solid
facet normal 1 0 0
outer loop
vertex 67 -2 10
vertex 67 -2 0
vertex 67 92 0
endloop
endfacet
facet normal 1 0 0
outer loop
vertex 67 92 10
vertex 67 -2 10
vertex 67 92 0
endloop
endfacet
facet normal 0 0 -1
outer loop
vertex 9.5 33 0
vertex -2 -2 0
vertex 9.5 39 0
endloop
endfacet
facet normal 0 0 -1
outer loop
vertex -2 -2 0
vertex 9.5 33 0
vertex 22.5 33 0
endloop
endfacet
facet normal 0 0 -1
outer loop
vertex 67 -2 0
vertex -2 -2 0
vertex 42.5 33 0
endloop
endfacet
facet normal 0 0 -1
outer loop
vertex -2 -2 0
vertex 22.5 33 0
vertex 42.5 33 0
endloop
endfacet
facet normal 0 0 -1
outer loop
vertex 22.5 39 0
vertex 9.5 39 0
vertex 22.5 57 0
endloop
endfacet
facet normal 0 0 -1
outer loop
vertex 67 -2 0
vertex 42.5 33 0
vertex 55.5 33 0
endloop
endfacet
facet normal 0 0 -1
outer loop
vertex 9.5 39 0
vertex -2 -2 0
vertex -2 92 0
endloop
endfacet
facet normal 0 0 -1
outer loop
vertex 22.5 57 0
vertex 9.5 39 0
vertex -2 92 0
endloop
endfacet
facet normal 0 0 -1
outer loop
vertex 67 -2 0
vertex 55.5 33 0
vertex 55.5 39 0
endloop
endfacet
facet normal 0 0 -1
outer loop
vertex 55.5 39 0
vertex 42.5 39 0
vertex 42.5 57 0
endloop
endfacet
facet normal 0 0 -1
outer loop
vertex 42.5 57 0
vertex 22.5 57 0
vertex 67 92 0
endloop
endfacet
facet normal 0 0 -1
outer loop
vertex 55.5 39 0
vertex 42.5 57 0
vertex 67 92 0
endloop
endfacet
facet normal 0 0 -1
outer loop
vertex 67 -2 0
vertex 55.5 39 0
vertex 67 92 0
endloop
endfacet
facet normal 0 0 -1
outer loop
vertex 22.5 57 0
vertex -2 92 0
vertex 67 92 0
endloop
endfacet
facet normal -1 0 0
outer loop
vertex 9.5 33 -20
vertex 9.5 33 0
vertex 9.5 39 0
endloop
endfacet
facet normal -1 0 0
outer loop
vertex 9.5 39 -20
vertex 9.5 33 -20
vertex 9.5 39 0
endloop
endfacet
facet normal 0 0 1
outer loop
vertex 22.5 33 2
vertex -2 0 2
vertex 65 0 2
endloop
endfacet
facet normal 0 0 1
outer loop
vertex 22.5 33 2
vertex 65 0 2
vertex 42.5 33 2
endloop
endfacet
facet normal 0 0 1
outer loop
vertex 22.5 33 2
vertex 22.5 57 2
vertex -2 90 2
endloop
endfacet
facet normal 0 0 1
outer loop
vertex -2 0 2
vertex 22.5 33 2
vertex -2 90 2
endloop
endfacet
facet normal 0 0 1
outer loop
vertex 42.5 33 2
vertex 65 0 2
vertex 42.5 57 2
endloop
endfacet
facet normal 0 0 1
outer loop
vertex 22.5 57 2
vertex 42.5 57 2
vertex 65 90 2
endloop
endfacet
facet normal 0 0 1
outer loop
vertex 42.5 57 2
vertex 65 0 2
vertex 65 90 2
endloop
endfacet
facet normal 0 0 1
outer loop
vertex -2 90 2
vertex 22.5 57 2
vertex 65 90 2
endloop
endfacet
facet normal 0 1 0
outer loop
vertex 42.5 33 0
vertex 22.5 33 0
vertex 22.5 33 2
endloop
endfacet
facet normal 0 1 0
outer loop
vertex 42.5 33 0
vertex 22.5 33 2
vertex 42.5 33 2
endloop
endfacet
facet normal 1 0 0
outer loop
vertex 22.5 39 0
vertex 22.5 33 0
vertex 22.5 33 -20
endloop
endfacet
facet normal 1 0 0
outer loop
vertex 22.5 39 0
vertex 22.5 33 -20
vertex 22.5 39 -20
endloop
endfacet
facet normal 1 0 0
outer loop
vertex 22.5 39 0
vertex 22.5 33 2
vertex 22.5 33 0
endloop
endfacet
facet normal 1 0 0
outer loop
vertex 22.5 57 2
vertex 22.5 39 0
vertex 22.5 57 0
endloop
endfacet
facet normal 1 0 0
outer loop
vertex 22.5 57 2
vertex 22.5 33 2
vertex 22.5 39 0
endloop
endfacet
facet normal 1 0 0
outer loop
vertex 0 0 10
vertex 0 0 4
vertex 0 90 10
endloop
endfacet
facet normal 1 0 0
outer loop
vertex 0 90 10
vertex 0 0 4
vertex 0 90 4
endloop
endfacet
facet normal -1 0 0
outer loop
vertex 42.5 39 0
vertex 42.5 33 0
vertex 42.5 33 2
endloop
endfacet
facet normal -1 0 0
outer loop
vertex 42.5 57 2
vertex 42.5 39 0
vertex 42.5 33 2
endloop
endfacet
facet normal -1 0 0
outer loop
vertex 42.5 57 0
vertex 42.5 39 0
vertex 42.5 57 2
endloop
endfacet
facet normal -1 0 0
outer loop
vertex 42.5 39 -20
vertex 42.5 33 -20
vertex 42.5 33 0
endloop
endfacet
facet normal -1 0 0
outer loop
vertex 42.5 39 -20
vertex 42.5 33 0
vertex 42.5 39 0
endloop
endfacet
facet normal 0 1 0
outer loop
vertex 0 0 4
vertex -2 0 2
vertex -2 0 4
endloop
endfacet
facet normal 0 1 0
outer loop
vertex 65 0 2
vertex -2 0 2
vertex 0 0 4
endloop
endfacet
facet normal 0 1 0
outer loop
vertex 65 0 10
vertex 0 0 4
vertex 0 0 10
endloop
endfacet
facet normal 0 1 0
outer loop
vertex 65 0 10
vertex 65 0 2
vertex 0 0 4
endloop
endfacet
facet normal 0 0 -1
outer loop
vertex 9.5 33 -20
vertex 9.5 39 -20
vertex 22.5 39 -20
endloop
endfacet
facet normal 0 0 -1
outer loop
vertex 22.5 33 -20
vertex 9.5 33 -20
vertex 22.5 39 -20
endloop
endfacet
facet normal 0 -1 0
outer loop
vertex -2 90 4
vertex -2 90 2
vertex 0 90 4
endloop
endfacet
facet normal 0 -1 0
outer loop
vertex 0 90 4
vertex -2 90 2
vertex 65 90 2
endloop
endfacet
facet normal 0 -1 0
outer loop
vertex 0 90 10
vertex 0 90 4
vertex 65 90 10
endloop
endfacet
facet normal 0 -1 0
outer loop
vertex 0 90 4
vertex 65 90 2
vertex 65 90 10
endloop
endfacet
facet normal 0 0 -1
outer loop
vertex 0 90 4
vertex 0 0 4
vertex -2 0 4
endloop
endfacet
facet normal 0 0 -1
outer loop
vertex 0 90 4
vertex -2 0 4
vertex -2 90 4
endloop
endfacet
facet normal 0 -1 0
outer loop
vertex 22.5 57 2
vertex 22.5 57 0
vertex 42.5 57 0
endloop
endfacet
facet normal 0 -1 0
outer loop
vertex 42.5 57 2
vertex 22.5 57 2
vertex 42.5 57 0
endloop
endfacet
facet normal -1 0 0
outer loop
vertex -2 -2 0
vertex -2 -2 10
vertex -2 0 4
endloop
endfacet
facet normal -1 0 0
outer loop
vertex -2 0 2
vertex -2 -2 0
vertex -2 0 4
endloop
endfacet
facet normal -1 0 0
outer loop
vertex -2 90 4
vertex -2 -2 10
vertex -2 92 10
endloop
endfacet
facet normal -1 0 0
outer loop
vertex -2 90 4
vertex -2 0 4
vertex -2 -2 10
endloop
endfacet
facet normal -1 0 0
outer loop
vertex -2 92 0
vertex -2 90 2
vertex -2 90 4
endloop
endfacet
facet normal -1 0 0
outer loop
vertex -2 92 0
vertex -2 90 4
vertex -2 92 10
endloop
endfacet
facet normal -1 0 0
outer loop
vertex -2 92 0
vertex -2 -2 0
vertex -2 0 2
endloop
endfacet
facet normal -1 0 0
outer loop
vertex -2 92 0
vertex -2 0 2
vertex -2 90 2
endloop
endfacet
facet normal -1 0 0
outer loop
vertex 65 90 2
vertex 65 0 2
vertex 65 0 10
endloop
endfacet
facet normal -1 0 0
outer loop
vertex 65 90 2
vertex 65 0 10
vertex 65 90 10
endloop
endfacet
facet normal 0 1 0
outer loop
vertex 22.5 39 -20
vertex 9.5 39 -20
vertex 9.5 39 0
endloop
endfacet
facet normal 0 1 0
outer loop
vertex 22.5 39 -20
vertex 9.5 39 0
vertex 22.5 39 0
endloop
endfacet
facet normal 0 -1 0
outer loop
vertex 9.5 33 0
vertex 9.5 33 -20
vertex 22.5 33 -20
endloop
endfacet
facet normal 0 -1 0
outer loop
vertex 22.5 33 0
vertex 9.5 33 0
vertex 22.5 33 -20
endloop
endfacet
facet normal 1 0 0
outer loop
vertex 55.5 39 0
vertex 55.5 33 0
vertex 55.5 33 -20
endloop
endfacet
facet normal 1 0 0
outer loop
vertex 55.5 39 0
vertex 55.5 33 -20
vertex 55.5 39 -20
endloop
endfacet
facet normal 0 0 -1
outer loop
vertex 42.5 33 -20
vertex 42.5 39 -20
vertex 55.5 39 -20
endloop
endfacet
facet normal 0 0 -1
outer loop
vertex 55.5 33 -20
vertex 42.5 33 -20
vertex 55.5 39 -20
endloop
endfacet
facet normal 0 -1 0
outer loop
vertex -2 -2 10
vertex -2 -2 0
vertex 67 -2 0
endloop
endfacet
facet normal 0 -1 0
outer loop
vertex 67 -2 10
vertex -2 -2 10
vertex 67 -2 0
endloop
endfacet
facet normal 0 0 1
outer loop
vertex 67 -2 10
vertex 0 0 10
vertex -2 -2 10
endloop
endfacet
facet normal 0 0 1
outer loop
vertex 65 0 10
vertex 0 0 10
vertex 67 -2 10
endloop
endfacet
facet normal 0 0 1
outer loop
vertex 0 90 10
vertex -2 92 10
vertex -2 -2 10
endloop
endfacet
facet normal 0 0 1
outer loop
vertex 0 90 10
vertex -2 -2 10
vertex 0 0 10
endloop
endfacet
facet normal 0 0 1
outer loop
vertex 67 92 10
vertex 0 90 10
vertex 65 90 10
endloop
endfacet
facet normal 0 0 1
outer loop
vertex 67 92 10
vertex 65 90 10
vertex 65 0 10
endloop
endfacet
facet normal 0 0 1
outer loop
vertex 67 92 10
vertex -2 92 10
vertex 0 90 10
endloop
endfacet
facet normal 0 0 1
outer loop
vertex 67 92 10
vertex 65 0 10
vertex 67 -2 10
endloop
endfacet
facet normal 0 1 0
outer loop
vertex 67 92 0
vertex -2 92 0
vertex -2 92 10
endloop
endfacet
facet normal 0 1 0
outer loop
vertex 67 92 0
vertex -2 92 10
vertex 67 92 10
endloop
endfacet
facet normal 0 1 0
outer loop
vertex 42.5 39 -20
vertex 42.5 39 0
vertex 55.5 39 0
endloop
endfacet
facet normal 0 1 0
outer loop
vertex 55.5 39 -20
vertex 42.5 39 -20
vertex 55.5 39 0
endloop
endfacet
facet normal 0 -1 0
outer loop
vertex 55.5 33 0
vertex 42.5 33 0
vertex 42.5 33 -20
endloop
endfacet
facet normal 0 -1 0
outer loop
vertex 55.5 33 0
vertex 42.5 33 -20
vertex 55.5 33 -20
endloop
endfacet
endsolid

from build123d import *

# Parameters (mm, degrees)
SKETCH_W             = 69
SKETCH_H             = 94
SKETCH_W_2           = 65
SKETCH_H_2           = 90
PAD_DEPTH            = 10
SKETCH001_W          = 65
SKETCH001_H          = 90
PAD001_DEPTH         = 2
SKETCH002_W          = 90
SKETCH002_H          = 2
POCKET_DEPTH         = 2.001
SKETCH003_W          = 20
SKETCH003_H          = 24
POCKET001_DEPTH      = 0.001
POCKET001_DEPTH_BACK = -10.001
SKETCH004_W          = 13
SKETCH004_H          = 6
PAD002_DEPTH         = 20


with BuildPart() as part:
    # Sketch → Pad (new body)
    with BuildSketch(Plane.XY):
        with Locations((32.5, 45)):
            Rectangle(SKETCH_W, SKETCH_H)
        with Locations((32.5, 45)):
            Rectangle(SKETCH_W_2, SKETCH_H_2, mode=Mode.SUBTRACT)
    extrude(amount=PAD_DEPTH)

    # Sketch001 → Pad001 (join)
    with BuildSketch(Plane.XY):
        with Locations((32.5, 45)):
            Rectangle(SKETCH001_W, SKETCH001_H)
    extrude(amount=PAD001_DEPTH)

    # Sketch002 → Pocket (cut, through all)
    with BuildSketch(Plane.YZ):
        with Locations((45, 3)):
            Rectangle(SKETCH002_W, SKETCH002_H)
    extrude(amount=-POCKET_DEPTH, mode=Mode.SUBTRACT)

    # Sketch003 → Pocket001 (cut, two sides)
    with BuildSketch(Plane.XY) as pocket001_sk:
        with Locations((32.5, 45)):
            Rectangle(SKETCH003_W, SKETCH003_H)
    extrude(amount=-POCKET001_DEPTH, mode=Mode.SUBTRACT)
    extrude(pocket001_sk.sketch, amount=-POCKET001_DEPTH_BACK, mode=Mode.SUBTRACT)

    # Sketch004 → Pad002 (join)
    with BuildSketch(Plane.XY):
        with Locations((16, 36)):
            Rectangle(SKETCH004_W, SKETCH004_H)
        with Locations((49, 36)):
            Rectangle(SKETCH004_W, SKETCH004_H)
    extrude(amount=-PAD002_DEPTH)


solid = part.part
